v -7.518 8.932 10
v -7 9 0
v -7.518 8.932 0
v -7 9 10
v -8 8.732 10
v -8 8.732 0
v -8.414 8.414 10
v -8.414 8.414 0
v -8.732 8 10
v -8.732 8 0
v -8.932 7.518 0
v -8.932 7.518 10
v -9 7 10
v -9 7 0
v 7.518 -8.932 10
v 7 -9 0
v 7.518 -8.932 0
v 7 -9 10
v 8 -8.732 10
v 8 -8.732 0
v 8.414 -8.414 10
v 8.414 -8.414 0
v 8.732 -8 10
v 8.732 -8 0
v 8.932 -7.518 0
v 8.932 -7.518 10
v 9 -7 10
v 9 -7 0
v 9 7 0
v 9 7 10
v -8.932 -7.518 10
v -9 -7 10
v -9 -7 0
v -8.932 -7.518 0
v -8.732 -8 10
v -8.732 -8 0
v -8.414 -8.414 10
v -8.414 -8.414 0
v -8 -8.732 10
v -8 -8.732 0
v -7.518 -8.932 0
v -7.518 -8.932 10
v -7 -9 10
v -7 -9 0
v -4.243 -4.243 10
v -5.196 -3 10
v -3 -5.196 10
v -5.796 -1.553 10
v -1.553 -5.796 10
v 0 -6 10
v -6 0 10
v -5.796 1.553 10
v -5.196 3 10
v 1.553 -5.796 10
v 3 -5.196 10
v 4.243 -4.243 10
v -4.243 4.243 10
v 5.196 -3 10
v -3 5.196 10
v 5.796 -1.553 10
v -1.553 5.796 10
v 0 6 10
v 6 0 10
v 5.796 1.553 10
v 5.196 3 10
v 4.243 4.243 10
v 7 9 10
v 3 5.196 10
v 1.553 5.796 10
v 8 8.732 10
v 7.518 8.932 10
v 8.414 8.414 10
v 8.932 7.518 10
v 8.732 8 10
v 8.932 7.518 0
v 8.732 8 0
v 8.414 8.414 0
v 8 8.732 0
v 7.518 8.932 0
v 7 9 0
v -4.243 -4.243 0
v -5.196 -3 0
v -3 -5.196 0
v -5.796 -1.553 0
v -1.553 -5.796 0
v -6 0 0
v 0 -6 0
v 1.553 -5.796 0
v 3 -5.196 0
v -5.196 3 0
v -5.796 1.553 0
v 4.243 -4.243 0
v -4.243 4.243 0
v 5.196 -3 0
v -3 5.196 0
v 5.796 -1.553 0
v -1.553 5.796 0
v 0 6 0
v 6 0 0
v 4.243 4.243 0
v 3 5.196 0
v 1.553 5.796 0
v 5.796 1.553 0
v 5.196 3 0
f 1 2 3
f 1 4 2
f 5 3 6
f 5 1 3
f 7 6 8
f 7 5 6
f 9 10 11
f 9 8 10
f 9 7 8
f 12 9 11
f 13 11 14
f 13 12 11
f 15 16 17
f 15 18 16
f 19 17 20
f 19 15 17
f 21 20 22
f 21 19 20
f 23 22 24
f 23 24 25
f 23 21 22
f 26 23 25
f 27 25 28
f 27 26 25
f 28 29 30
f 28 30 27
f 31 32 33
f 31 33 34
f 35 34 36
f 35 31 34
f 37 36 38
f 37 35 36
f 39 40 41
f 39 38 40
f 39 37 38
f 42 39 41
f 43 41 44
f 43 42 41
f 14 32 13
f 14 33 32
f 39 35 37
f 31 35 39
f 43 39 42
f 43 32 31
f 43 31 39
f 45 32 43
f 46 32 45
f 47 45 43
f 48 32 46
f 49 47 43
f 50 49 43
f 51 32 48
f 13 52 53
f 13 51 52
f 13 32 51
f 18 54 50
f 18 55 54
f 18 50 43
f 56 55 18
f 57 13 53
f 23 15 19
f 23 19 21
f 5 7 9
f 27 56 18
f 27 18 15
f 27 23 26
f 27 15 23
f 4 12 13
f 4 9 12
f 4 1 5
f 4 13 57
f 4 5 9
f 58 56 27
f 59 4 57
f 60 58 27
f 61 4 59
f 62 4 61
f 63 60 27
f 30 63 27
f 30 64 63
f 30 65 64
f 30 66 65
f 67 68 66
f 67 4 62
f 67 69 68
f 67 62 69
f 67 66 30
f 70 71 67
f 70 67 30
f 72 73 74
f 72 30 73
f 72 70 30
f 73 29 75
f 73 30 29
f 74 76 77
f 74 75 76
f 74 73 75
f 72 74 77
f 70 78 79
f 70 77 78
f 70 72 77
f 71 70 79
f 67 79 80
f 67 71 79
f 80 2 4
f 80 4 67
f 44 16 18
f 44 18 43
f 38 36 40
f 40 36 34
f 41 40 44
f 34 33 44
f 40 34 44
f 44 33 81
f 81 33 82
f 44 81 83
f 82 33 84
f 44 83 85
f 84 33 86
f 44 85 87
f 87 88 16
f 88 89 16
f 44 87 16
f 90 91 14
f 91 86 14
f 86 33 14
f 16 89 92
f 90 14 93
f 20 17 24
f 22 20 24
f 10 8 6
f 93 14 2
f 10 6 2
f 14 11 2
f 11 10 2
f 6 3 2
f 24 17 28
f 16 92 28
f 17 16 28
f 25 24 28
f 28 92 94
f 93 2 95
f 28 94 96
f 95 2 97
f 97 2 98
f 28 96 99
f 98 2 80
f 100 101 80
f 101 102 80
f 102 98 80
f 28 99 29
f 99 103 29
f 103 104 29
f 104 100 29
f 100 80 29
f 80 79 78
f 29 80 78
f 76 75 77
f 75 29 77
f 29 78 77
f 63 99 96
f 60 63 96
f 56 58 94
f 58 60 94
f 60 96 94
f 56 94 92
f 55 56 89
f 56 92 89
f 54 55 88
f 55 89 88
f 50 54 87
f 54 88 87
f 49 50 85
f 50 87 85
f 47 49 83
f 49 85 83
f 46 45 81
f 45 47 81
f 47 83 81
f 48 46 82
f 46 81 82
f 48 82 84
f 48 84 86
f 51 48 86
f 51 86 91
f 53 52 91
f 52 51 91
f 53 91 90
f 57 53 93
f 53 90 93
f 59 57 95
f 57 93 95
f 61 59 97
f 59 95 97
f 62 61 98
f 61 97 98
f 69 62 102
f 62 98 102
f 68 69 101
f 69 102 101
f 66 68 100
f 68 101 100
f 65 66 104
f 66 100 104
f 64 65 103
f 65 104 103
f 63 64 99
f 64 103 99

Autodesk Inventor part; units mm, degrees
ref_plane "YZ Plane" through (0, 0, 0) normal (1, 0, 0) x (0, 1, 0)
ref_plane "XZ Plane" through (0, 0, 0) normal (0, 1, 0) x (-1, 0, 0)
ref_plane "XY Plane" through (0, 0, 0) normal (0, 0, 1) x (1, 0, 0)
sketch "Skizze1" plane through (0, 0, 0) normal (0, 0, 1) x (1, 0, 0)
  line L0 (9, -9) -> (-9, -9)
  line L1 (-9, -9) -> (-9, 9)
  line L2 (-9, 9) -> (9, 9)
  line L3 (9, 9) -> (9, -9)
  line L4 (9, -9) -> (-9, 9) construction
  line L5 (-9, -9) -> (9, 9) construction
  circle A0 centre (0, 0) radius 6
  dimension "d0" = 18
  dimension "d1" = 18
  dimension "d2" = 12
extrude "Extrusion1" add sketch "Skizze1" along normal blind 10
fillet "Rundung1" radius 2 4 edges at (9, 9, 5) (-9, 9, 5) (9, -9, 5) (-9, -9, 5)
properties part number "00_CCTV_M12_VCM"
